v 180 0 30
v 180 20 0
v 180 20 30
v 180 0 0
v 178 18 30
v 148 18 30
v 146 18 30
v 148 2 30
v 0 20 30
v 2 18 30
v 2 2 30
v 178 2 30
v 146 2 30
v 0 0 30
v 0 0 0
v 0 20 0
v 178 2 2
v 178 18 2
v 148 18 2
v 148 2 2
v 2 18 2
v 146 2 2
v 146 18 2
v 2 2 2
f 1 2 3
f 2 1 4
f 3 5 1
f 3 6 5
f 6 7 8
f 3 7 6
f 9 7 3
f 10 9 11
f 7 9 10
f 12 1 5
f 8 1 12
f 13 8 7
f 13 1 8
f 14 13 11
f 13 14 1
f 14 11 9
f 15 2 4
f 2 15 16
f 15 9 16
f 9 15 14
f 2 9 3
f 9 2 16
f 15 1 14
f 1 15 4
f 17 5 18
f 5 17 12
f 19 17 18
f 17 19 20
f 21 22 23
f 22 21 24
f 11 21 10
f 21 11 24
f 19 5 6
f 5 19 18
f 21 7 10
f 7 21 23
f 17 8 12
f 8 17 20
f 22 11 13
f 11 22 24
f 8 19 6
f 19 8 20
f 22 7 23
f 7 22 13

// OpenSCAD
// rinse container for the brush (written by rinse_container.py; change the numbers and render in OpenSCAD)
L = 180; W = 20; H = 30;      // outside
wall = 2; floor_t = 2;
dry_inside = 30;                    // blot compartment, inside length
rib_thick = 1.2; rib_pitch = 8; rib_below_rim = 4; rib_free = 10;
xd = L - wall - dry_inside - wall;              // the divider
union() {
    difference() {
        cube([L, W, H]);
        translate([wall, wall, floor_t]) cube([L - 2 * wall, W - 2 * wall, H]);
    }
    translate([xd, 0, 0]) cube([wall, W, H]);   // divider (full height: the blot side stays dry)
}
